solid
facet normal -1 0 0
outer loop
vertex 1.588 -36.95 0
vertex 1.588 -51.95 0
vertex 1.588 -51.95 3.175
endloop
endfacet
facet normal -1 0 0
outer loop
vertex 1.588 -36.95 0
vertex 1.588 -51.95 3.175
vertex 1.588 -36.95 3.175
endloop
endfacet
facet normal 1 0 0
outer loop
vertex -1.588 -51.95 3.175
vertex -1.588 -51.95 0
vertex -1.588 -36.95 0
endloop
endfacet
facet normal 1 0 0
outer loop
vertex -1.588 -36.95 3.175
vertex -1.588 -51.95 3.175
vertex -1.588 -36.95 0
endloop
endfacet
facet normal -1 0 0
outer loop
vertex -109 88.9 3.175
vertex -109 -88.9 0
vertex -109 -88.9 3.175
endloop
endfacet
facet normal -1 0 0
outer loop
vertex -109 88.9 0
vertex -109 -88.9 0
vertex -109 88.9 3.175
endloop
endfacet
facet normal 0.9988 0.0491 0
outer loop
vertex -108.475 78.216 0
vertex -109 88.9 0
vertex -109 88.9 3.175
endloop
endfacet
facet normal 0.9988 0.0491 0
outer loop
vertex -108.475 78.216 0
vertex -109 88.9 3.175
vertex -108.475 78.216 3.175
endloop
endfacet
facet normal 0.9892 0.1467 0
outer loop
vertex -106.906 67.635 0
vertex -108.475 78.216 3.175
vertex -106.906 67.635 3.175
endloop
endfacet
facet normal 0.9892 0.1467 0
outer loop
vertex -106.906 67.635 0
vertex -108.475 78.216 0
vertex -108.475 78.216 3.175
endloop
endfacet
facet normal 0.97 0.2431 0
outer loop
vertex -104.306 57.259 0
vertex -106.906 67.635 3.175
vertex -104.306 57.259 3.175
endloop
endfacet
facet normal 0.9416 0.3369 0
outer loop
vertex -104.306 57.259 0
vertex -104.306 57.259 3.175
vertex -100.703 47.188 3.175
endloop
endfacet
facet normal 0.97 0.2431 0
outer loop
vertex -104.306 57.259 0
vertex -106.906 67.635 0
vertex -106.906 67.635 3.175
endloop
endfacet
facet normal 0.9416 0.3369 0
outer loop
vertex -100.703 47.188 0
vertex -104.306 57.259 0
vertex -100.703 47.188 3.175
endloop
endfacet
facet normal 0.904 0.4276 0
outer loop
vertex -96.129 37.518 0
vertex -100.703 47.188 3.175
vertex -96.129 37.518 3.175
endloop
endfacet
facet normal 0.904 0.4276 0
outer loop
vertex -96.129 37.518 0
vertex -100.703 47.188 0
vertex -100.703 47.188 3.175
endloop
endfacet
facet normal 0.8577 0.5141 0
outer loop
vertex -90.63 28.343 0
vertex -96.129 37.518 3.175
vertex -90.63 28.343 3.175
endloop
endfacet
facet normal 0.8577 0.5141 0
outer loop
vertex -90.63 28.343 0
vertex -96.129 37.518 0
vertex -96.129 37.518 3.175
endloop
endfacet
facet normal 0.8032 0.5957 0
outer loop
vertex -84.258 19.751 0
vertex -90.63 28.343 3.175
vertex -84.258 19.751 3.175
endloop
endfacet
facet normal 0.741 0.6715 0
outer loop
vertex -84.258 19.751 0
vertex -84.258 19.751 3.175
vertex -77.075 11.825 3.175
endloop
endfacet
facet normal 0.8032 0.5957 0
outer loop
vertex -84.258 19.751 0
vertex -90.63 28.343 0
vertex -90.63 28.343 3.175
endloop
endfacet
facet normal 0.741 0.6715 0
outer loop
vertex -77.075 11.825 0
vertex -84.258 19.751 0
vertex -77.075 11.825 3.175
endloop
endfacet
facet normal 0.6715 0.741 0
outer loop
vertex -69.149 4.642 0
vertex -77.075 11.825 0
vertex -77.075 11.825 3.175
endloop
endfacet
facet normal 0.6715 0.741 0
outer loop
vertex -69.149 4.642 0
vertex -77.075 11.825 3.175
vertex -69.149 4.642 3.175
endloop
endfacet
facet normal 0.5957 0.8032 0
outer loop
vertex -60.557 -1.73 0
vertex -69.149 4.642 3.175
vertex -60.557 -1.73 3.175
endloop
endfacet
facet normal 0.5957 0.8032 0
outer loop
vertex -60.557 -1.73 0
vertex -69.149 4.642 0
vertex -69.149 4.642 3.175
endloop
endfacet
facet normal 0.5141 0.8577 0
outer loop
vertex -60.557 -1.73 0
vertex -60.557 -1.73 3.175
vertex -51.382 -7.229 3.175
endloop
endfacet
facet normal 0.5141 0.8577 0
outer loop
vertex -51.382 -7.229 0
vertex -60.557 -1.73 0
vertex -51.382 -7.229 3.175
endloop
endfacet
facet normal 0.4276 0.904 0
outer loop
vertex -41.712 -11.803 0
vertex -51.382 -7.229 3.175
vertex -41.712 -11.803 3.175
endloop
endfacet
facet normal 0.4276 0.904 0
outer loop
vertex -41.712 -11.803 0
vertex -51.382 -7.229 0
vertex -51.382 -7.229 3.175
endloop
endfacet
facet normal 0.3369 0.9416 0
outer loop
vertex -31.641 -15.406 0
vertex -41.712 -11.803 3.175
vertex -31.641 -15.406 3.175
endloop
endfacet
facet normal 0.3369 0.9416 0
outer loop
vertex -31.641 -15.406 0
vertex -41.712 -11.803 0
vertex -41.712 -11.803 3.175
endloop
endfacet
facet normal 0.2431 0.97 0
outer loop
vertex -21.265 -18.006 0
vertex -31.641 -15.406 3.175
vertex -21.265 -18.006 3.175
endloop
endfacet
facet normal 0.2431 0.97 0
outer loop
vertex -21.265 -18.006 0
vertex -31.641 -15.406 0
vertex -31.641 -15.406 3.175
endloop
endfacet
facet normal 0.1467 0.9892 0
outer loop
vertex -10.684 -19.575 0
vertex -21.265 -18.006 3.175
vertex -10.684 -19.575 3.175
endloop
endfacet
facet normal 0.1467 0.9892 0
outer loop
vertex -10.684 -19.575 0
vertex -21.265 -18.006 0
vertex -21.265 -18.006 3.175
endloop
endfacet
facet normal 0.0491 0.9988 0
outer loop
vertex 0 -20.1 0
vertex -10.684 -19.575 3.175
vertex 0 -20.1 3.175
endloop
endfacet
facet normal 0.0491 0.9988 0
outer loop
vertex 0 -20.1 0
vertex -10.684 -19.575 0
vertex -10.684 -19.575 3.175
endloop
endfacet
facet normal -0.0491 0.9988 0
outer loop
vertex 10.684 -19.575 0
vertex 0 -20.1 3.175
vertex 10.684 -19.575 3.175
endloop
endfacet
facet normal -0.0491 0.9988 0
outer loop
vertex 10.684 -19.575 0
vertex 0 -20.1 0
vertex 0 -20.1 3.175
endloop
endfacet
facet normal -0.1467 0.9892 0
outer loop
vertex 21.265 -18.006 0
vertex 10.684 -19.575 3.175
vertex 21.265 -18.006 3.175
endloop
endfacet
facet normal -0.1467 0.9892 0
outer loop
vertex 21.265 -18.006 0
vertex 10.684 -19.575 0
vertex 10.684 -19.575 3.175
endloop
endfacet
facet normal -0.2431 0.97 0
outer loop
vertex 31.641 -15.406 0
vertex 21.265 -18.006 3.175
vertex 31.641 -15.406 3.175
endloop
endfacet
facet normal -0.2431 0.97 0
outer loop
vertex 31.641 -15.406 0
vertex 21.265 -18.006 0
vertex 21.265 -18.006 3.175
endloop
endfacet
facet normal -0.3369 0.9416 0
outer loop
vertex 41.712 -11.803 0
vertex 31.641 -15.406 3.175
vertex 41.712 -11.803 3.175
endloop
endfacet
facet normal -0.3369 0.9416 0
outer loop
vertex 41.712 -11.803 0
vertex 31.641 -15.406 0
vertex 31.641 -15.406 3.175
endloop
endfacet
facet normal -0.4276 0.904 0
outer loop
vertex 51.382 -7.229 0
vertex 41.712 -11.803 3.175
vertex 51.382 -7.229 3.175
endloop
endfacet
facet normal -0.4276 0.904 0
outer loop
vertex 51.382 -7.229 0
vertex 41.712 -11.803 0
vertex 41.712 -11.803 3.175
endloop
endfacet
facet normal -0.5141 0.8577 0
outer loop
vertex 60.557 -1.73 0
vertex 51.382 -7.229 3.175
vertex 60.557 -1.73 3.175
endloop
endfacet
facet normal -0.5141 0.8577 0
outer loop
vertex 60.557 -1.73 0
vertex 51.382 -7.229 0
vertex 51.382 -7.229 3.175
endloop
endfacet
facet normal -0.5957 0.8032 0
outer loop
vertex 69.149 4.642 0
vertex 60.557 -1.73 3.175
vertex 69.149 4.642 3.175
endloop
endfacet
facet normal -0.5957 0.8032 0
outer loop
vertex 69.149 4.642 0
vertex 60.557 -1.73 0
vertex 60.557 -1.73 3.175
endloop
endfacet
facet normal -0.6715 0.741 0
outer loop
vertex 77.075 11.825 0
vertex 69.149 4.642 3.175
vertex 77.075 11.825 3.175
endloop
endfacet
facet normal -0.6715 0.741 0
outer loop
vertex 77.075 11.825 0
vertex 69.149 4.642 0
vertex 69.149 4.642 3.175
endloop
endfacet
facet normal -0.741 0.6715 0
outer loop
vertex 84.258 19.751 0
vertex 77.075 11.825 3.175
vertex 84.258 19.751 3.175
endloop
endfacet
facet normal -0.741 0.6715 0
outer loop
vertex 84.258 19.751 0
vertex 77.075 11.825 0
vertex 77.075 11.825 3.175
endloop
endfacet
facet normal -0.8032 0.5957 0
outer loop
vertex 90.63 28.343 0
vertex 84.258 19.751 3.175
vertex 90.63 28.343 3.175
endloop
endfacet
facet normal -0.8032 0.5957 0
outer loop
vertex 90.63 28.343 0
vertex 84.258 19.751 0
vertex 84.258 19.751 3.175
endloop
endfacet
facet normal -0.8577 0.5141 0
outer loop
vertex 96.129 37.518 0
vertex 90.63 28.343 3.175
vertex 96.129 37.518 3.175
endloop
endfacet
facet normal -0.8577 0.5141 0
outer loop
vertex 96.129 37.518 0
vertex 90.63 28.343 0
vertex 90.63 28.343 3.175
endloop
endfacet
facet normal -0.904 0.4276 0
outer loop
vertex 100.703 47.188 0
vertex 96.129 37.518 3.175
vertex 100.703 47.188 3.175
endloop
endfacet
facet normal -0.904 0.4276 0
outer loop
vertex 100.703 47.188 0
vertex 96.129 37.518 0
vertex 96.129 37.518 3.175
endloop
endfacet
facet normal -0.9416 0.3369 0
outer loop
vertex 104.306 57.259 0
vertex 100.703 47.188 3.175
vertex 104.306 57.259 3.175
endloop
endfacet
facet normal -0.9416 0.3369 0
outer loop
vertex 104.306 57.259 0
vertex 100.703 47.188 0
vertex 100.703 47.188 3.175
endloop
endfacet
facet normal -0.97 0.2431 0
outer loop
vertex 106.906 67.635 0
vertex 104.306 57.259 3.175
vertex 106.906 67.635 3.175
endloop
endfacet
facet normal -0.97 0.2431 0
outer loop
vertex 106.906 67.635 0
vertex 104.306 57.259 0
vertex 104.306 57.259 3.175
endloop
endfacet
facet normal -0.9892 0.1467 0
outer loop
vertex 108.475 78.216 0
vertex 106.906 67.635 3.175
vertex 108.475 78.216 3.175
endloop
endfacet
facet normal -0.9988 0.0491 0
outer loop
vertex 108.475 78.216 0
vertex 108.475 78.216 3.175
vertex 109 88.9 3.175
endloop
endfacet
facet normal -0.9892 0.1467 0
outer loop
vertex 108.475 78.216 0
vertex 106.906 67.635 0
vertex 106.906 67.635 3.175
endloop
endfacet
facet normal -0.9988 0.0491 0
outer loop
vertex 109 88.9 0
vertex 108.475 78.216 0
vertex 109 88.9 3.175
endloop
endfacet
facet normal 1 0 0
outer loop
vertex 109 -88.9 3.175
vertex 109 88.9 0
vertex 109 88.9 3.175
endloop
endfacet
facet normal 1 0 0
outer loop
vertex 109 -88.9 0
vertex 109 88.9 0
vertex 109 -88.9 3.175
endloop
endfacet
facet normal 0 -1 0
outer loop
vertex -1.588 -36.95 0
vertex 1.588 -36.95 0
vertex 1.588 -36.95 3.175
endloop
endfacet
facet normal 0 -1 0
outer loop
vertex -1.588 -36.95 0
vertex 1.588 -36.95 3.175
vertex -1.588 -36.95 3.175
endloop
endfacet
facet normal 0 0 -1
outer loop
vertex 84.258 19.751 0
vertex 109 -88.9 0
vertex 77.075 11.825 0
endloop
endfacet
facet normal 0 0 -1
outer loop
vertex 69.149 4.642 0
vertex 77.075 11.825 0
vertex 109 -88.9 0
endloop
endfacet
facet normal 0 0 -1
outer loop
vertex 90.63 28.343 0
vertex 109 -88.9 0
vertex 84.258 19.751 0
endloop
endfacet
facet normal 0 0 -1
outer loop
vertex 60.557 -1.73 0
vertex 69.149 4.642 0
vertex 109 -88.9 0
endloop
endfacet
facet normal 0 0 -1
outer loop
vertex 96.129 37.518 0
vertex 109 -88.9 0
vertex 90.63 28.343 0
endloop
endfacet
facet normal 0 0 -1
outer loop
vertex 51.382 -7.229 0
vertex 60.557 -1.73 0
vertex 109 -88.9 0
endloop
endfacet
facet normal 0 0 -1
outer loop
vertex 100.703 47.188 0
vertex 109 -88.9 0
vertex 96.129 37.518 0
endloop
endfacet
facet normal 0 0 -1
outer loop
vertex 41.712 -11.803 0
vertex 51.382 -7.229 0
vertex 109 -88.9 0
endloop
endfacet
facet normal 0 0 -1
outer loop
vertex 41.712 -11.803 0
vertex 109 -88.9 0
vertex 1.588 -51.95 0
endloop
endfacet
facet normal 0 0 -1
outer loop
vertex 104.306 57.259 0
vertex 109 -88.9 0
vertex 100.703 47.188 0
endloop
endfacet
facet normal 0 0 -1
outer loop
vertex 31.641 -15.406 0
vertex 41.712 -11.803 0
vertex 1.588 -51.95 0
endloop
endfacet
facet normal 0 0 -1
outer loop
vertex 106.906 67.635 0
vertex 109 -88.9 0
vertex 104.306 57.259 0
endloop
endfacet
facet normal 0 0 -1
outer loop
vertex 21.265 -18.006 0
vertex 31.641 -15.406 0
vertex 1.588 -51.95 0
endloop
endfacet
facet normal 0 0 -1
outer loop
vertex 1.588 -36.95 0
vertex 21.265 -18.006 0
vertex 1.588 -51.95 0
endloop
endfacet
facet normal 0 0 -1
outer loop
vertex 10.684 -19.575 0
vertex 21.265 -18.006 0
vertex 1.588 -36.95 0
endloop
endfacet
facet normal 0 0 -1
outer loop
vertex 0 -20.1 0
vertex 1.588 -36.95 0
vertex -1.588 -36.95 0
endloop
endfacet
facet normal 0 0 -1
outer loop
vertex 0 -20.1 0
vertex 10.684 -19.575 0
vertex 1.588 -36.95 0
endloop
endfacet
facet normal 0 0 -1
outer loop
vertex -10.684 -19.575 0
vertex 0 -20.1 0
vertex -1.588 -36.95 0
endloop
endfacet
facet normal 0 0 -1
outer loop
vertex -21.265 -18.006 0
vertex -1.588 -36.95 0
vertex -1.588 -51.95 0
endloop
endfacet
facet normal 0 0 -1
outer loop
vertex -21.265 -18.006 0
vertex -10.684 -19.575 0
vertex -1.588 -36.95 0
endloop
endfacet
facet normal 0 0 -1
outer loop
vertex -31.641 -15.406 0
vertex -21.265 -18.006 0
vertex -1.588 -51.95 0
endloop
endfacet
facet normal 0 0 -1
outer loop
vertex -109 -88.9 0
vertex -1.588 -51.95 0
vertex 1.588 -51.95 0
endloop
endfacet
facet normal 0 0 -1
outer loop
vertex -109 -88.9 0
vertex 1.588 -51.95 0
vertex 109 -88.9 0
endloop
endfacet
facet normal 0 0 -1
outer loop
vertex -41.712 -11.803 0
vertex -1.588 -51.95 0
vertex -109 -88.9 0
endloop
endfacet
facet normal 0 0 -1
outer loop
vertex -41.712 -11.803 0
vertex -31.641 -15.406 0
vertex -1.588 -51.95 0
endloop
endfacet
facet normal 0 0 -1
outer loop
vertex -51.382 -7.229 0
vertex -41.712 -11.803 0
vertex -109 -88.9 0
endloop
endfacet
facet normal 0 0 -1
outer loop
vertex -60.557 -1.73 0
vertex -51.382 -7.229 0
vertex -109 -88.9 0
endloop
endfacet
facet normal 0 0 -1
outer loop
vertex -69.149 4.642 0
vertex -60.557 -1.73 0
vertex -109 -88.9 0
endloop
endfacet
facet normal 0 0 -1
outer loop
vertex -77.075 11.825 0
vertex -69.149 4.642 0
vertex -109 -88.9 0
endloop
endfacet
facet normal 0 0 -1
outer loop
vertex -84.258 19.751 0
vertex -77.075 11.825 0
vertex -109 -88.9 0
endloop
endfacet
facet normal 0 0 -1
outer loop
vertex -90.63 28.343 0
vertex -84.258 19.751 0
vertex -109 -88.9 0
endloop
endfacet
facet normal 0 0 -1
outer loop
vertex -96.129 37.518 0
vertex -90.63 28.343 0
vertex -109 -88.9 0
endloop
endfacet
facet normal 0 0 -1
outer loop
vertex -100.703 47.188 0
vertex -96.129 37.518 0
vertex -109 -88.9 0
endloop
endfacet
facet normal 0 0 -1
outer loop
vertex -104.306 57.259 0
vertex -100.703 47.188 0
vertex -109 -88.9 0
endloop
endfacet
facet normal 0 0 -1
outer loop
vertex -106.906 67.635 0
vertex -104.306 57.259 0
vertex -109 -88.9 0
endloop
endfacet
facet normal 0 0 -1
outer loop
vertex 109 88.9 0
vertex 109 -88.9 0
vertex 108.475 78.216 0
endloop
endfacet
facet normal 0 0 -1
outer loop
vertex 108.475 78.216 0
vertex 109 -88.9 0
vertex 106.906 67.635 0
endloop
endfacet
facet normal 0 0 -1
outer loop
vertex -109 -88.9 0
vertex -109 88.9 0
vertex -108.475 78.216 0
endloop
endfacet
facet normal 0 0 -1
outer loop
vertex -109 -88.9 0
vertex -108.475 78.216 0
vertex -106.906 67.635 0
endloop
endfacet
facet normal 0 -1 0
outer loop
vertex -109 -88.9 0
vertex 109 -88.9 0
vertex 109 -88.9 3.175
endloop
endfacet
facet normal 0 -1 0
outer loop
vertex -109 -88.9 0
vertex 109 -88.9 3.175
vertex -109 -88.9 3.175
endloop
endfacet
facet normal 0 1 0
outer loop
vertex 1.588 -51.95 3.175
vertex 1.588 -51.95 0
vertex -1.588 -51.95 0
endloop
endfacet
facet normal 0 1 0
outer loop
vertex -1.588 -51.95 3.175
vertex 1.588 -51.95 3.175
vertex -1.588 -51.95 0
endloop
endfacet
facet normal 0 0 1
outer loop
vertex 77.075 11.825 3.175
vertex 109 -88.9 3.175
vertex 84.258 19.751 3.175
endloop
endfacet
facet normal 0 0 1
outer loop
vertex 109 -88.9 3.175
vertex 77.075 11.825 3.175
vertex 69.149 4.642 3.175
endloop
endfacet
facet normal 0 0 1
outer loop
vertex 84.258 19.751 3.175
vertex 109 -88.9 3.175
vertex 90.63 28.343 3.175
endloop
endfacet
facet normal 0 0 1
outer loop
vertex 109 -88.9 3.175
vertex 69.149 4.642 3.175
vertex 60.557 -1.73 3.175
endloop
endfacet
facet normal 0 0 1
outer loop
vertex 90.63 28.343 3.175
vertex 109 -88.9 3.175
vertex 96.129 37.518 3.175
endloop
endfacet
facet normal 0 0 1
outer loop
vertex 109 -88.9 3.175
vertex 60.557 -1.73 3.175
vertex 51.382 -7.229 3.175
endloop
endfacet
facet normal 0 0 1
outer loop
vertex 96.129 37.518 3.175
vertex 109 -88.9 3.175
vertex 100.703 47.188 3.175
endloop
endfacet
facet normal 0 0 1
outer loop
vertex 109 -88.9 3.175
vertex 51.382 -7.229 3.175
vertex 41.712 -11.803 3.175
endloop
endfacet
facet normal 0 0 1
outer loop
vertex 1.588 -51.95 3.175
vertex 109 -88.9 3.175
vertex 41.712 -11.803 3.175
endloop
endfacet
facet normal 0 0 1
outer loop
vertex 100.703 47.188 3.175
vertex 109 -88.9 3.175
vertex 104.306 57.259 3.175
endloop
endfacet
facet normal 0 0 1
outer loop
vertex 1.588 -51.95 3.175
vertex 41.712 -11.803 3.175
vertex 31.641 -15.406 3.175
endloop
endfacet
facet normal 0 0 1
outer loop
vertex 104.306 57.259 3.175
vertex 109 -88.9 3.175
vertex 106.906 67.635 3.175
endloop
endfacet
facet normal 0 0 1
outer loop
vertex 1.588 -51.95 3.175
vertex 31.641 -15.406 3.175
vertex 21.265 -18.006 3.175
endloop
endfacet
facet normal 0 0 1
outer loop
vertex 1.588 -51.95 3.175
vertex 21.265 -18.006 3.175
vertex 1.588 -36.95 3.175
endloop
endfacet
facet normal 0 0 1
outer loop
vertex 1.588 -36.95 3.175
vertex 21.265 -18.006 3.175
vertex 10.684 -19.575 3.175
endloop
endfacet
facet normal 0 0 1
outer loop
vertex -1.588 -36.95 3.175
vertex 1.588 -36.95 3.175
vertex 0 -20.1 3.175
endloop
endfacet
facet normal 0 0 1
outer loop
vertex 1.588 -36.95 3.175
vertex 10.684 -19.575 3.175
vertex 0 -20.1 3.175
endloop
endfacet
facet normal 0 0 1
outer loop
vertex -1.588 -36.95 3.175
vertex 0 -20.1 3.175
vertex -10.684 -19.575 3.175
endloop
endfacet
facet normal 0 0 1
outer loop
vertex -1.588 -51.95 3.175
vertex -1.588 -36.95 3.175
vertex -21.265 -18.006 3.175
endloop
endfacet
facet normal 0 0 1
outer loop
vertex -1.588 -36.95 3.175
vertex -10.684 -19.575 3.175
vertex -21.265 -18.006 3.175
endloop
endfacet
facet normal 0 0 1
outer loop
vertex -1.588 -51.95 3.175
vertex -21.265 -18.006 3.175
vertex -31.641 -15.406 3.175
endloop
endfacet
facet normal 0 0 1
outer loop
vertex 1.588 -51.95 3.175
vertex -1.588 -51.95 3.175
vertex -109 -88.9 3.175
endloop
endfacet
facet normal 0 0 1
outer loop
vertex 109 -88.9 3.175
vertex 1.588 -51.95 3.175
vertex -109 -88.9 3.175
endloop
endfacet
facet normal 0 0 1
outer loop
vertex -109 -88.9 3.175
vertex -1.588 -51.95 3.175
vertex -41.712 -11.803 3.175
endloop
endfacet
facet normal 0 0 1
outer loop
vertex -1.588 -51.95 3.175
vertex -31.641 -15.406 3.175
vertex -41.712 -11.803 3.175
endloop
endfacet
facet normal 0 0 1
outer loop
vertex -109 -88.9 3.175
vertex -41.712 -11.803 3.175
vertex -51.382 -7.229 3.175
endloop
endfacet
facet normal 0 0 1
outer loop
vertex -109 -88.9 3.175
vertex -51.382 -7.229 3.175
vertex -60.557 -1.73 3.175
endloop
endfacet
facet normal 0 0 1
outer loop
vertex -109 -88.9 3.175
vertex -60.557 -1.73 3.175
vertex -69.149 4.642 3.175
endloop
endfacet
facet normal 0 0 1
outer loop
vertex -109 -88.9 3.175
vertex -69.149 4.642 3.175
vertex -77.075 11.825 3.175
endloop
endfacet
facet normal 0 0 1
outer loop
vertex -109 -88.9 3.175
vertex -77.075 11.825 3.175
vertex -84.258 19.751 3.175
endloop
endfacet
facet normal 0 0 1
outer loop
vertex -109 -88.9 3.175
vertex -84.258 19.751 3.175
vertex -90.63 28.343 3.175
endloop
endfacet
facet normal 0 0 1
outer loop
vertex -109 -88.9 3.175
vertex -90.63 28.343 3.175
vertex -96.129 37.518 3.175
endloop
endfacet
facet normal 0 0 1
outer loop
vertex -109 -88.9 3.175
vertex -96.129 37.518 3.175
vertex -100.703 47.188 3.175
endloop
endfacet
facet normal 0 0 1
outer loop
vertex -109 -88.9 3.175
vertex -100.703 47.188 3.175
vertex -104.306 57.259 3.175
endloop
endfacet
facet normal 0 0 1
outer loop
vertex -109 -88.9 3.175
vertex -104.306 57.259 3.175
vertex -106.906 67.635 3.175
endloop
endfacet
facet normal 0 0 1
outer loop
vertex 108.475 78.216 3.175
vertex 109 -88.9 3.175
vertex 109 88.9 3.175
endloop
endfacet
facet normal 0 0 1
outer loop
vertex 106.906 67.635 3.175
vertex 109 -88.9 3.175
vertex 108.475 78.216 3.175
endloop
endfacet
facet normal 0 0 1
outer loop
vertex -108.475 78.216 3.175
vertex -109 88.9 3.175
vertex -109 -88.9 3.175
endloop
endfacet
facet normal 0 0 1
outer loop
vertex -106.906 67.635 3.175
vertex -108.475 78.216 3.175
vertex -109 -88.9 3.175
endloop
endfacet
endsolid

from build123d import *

# Parameters (mm, degrees)
BOSS_EXTRUDE1_DEPTH = 3.175
SKETCH2_W           = 3.175
SKETCH2_H           = 15
CUT_EXTRUDE1_DEPTH  = 3.175


with BuildPart() as part:
    # Sketch1 → Boss-Extrude1 (new body)
    with BuildSketch(Plane.XY):
        with BuildLine():
            ThreePointArc((-109, 88.9), (0, -20.1), (109, 88.9))
            Line((109, 88.9), (109, -88.9))
            Line((109, -88.9), (-109, -88.9))
            Line((-109, -88.9), (-109, 88.9))
        make_face()
    extrude(amount=BOSS_EXTRUDE1_DEPTH)

    # Sketch2 → Cut-Extrude1 (cut)
    with BuildSketch(Plane(origin=(0, 0, 0), x_dir=(-1, 0, 0), z_dir=(0, 0, -1))):
        with Locations((0, -44.45)):
            Rectangle(SKETCH2_W, SKETCH2_H)
    extrude(amount=-CUT_EXTRUDE1_DEPTH, mode=Mode.SUBTRACT)


solid = part.part
